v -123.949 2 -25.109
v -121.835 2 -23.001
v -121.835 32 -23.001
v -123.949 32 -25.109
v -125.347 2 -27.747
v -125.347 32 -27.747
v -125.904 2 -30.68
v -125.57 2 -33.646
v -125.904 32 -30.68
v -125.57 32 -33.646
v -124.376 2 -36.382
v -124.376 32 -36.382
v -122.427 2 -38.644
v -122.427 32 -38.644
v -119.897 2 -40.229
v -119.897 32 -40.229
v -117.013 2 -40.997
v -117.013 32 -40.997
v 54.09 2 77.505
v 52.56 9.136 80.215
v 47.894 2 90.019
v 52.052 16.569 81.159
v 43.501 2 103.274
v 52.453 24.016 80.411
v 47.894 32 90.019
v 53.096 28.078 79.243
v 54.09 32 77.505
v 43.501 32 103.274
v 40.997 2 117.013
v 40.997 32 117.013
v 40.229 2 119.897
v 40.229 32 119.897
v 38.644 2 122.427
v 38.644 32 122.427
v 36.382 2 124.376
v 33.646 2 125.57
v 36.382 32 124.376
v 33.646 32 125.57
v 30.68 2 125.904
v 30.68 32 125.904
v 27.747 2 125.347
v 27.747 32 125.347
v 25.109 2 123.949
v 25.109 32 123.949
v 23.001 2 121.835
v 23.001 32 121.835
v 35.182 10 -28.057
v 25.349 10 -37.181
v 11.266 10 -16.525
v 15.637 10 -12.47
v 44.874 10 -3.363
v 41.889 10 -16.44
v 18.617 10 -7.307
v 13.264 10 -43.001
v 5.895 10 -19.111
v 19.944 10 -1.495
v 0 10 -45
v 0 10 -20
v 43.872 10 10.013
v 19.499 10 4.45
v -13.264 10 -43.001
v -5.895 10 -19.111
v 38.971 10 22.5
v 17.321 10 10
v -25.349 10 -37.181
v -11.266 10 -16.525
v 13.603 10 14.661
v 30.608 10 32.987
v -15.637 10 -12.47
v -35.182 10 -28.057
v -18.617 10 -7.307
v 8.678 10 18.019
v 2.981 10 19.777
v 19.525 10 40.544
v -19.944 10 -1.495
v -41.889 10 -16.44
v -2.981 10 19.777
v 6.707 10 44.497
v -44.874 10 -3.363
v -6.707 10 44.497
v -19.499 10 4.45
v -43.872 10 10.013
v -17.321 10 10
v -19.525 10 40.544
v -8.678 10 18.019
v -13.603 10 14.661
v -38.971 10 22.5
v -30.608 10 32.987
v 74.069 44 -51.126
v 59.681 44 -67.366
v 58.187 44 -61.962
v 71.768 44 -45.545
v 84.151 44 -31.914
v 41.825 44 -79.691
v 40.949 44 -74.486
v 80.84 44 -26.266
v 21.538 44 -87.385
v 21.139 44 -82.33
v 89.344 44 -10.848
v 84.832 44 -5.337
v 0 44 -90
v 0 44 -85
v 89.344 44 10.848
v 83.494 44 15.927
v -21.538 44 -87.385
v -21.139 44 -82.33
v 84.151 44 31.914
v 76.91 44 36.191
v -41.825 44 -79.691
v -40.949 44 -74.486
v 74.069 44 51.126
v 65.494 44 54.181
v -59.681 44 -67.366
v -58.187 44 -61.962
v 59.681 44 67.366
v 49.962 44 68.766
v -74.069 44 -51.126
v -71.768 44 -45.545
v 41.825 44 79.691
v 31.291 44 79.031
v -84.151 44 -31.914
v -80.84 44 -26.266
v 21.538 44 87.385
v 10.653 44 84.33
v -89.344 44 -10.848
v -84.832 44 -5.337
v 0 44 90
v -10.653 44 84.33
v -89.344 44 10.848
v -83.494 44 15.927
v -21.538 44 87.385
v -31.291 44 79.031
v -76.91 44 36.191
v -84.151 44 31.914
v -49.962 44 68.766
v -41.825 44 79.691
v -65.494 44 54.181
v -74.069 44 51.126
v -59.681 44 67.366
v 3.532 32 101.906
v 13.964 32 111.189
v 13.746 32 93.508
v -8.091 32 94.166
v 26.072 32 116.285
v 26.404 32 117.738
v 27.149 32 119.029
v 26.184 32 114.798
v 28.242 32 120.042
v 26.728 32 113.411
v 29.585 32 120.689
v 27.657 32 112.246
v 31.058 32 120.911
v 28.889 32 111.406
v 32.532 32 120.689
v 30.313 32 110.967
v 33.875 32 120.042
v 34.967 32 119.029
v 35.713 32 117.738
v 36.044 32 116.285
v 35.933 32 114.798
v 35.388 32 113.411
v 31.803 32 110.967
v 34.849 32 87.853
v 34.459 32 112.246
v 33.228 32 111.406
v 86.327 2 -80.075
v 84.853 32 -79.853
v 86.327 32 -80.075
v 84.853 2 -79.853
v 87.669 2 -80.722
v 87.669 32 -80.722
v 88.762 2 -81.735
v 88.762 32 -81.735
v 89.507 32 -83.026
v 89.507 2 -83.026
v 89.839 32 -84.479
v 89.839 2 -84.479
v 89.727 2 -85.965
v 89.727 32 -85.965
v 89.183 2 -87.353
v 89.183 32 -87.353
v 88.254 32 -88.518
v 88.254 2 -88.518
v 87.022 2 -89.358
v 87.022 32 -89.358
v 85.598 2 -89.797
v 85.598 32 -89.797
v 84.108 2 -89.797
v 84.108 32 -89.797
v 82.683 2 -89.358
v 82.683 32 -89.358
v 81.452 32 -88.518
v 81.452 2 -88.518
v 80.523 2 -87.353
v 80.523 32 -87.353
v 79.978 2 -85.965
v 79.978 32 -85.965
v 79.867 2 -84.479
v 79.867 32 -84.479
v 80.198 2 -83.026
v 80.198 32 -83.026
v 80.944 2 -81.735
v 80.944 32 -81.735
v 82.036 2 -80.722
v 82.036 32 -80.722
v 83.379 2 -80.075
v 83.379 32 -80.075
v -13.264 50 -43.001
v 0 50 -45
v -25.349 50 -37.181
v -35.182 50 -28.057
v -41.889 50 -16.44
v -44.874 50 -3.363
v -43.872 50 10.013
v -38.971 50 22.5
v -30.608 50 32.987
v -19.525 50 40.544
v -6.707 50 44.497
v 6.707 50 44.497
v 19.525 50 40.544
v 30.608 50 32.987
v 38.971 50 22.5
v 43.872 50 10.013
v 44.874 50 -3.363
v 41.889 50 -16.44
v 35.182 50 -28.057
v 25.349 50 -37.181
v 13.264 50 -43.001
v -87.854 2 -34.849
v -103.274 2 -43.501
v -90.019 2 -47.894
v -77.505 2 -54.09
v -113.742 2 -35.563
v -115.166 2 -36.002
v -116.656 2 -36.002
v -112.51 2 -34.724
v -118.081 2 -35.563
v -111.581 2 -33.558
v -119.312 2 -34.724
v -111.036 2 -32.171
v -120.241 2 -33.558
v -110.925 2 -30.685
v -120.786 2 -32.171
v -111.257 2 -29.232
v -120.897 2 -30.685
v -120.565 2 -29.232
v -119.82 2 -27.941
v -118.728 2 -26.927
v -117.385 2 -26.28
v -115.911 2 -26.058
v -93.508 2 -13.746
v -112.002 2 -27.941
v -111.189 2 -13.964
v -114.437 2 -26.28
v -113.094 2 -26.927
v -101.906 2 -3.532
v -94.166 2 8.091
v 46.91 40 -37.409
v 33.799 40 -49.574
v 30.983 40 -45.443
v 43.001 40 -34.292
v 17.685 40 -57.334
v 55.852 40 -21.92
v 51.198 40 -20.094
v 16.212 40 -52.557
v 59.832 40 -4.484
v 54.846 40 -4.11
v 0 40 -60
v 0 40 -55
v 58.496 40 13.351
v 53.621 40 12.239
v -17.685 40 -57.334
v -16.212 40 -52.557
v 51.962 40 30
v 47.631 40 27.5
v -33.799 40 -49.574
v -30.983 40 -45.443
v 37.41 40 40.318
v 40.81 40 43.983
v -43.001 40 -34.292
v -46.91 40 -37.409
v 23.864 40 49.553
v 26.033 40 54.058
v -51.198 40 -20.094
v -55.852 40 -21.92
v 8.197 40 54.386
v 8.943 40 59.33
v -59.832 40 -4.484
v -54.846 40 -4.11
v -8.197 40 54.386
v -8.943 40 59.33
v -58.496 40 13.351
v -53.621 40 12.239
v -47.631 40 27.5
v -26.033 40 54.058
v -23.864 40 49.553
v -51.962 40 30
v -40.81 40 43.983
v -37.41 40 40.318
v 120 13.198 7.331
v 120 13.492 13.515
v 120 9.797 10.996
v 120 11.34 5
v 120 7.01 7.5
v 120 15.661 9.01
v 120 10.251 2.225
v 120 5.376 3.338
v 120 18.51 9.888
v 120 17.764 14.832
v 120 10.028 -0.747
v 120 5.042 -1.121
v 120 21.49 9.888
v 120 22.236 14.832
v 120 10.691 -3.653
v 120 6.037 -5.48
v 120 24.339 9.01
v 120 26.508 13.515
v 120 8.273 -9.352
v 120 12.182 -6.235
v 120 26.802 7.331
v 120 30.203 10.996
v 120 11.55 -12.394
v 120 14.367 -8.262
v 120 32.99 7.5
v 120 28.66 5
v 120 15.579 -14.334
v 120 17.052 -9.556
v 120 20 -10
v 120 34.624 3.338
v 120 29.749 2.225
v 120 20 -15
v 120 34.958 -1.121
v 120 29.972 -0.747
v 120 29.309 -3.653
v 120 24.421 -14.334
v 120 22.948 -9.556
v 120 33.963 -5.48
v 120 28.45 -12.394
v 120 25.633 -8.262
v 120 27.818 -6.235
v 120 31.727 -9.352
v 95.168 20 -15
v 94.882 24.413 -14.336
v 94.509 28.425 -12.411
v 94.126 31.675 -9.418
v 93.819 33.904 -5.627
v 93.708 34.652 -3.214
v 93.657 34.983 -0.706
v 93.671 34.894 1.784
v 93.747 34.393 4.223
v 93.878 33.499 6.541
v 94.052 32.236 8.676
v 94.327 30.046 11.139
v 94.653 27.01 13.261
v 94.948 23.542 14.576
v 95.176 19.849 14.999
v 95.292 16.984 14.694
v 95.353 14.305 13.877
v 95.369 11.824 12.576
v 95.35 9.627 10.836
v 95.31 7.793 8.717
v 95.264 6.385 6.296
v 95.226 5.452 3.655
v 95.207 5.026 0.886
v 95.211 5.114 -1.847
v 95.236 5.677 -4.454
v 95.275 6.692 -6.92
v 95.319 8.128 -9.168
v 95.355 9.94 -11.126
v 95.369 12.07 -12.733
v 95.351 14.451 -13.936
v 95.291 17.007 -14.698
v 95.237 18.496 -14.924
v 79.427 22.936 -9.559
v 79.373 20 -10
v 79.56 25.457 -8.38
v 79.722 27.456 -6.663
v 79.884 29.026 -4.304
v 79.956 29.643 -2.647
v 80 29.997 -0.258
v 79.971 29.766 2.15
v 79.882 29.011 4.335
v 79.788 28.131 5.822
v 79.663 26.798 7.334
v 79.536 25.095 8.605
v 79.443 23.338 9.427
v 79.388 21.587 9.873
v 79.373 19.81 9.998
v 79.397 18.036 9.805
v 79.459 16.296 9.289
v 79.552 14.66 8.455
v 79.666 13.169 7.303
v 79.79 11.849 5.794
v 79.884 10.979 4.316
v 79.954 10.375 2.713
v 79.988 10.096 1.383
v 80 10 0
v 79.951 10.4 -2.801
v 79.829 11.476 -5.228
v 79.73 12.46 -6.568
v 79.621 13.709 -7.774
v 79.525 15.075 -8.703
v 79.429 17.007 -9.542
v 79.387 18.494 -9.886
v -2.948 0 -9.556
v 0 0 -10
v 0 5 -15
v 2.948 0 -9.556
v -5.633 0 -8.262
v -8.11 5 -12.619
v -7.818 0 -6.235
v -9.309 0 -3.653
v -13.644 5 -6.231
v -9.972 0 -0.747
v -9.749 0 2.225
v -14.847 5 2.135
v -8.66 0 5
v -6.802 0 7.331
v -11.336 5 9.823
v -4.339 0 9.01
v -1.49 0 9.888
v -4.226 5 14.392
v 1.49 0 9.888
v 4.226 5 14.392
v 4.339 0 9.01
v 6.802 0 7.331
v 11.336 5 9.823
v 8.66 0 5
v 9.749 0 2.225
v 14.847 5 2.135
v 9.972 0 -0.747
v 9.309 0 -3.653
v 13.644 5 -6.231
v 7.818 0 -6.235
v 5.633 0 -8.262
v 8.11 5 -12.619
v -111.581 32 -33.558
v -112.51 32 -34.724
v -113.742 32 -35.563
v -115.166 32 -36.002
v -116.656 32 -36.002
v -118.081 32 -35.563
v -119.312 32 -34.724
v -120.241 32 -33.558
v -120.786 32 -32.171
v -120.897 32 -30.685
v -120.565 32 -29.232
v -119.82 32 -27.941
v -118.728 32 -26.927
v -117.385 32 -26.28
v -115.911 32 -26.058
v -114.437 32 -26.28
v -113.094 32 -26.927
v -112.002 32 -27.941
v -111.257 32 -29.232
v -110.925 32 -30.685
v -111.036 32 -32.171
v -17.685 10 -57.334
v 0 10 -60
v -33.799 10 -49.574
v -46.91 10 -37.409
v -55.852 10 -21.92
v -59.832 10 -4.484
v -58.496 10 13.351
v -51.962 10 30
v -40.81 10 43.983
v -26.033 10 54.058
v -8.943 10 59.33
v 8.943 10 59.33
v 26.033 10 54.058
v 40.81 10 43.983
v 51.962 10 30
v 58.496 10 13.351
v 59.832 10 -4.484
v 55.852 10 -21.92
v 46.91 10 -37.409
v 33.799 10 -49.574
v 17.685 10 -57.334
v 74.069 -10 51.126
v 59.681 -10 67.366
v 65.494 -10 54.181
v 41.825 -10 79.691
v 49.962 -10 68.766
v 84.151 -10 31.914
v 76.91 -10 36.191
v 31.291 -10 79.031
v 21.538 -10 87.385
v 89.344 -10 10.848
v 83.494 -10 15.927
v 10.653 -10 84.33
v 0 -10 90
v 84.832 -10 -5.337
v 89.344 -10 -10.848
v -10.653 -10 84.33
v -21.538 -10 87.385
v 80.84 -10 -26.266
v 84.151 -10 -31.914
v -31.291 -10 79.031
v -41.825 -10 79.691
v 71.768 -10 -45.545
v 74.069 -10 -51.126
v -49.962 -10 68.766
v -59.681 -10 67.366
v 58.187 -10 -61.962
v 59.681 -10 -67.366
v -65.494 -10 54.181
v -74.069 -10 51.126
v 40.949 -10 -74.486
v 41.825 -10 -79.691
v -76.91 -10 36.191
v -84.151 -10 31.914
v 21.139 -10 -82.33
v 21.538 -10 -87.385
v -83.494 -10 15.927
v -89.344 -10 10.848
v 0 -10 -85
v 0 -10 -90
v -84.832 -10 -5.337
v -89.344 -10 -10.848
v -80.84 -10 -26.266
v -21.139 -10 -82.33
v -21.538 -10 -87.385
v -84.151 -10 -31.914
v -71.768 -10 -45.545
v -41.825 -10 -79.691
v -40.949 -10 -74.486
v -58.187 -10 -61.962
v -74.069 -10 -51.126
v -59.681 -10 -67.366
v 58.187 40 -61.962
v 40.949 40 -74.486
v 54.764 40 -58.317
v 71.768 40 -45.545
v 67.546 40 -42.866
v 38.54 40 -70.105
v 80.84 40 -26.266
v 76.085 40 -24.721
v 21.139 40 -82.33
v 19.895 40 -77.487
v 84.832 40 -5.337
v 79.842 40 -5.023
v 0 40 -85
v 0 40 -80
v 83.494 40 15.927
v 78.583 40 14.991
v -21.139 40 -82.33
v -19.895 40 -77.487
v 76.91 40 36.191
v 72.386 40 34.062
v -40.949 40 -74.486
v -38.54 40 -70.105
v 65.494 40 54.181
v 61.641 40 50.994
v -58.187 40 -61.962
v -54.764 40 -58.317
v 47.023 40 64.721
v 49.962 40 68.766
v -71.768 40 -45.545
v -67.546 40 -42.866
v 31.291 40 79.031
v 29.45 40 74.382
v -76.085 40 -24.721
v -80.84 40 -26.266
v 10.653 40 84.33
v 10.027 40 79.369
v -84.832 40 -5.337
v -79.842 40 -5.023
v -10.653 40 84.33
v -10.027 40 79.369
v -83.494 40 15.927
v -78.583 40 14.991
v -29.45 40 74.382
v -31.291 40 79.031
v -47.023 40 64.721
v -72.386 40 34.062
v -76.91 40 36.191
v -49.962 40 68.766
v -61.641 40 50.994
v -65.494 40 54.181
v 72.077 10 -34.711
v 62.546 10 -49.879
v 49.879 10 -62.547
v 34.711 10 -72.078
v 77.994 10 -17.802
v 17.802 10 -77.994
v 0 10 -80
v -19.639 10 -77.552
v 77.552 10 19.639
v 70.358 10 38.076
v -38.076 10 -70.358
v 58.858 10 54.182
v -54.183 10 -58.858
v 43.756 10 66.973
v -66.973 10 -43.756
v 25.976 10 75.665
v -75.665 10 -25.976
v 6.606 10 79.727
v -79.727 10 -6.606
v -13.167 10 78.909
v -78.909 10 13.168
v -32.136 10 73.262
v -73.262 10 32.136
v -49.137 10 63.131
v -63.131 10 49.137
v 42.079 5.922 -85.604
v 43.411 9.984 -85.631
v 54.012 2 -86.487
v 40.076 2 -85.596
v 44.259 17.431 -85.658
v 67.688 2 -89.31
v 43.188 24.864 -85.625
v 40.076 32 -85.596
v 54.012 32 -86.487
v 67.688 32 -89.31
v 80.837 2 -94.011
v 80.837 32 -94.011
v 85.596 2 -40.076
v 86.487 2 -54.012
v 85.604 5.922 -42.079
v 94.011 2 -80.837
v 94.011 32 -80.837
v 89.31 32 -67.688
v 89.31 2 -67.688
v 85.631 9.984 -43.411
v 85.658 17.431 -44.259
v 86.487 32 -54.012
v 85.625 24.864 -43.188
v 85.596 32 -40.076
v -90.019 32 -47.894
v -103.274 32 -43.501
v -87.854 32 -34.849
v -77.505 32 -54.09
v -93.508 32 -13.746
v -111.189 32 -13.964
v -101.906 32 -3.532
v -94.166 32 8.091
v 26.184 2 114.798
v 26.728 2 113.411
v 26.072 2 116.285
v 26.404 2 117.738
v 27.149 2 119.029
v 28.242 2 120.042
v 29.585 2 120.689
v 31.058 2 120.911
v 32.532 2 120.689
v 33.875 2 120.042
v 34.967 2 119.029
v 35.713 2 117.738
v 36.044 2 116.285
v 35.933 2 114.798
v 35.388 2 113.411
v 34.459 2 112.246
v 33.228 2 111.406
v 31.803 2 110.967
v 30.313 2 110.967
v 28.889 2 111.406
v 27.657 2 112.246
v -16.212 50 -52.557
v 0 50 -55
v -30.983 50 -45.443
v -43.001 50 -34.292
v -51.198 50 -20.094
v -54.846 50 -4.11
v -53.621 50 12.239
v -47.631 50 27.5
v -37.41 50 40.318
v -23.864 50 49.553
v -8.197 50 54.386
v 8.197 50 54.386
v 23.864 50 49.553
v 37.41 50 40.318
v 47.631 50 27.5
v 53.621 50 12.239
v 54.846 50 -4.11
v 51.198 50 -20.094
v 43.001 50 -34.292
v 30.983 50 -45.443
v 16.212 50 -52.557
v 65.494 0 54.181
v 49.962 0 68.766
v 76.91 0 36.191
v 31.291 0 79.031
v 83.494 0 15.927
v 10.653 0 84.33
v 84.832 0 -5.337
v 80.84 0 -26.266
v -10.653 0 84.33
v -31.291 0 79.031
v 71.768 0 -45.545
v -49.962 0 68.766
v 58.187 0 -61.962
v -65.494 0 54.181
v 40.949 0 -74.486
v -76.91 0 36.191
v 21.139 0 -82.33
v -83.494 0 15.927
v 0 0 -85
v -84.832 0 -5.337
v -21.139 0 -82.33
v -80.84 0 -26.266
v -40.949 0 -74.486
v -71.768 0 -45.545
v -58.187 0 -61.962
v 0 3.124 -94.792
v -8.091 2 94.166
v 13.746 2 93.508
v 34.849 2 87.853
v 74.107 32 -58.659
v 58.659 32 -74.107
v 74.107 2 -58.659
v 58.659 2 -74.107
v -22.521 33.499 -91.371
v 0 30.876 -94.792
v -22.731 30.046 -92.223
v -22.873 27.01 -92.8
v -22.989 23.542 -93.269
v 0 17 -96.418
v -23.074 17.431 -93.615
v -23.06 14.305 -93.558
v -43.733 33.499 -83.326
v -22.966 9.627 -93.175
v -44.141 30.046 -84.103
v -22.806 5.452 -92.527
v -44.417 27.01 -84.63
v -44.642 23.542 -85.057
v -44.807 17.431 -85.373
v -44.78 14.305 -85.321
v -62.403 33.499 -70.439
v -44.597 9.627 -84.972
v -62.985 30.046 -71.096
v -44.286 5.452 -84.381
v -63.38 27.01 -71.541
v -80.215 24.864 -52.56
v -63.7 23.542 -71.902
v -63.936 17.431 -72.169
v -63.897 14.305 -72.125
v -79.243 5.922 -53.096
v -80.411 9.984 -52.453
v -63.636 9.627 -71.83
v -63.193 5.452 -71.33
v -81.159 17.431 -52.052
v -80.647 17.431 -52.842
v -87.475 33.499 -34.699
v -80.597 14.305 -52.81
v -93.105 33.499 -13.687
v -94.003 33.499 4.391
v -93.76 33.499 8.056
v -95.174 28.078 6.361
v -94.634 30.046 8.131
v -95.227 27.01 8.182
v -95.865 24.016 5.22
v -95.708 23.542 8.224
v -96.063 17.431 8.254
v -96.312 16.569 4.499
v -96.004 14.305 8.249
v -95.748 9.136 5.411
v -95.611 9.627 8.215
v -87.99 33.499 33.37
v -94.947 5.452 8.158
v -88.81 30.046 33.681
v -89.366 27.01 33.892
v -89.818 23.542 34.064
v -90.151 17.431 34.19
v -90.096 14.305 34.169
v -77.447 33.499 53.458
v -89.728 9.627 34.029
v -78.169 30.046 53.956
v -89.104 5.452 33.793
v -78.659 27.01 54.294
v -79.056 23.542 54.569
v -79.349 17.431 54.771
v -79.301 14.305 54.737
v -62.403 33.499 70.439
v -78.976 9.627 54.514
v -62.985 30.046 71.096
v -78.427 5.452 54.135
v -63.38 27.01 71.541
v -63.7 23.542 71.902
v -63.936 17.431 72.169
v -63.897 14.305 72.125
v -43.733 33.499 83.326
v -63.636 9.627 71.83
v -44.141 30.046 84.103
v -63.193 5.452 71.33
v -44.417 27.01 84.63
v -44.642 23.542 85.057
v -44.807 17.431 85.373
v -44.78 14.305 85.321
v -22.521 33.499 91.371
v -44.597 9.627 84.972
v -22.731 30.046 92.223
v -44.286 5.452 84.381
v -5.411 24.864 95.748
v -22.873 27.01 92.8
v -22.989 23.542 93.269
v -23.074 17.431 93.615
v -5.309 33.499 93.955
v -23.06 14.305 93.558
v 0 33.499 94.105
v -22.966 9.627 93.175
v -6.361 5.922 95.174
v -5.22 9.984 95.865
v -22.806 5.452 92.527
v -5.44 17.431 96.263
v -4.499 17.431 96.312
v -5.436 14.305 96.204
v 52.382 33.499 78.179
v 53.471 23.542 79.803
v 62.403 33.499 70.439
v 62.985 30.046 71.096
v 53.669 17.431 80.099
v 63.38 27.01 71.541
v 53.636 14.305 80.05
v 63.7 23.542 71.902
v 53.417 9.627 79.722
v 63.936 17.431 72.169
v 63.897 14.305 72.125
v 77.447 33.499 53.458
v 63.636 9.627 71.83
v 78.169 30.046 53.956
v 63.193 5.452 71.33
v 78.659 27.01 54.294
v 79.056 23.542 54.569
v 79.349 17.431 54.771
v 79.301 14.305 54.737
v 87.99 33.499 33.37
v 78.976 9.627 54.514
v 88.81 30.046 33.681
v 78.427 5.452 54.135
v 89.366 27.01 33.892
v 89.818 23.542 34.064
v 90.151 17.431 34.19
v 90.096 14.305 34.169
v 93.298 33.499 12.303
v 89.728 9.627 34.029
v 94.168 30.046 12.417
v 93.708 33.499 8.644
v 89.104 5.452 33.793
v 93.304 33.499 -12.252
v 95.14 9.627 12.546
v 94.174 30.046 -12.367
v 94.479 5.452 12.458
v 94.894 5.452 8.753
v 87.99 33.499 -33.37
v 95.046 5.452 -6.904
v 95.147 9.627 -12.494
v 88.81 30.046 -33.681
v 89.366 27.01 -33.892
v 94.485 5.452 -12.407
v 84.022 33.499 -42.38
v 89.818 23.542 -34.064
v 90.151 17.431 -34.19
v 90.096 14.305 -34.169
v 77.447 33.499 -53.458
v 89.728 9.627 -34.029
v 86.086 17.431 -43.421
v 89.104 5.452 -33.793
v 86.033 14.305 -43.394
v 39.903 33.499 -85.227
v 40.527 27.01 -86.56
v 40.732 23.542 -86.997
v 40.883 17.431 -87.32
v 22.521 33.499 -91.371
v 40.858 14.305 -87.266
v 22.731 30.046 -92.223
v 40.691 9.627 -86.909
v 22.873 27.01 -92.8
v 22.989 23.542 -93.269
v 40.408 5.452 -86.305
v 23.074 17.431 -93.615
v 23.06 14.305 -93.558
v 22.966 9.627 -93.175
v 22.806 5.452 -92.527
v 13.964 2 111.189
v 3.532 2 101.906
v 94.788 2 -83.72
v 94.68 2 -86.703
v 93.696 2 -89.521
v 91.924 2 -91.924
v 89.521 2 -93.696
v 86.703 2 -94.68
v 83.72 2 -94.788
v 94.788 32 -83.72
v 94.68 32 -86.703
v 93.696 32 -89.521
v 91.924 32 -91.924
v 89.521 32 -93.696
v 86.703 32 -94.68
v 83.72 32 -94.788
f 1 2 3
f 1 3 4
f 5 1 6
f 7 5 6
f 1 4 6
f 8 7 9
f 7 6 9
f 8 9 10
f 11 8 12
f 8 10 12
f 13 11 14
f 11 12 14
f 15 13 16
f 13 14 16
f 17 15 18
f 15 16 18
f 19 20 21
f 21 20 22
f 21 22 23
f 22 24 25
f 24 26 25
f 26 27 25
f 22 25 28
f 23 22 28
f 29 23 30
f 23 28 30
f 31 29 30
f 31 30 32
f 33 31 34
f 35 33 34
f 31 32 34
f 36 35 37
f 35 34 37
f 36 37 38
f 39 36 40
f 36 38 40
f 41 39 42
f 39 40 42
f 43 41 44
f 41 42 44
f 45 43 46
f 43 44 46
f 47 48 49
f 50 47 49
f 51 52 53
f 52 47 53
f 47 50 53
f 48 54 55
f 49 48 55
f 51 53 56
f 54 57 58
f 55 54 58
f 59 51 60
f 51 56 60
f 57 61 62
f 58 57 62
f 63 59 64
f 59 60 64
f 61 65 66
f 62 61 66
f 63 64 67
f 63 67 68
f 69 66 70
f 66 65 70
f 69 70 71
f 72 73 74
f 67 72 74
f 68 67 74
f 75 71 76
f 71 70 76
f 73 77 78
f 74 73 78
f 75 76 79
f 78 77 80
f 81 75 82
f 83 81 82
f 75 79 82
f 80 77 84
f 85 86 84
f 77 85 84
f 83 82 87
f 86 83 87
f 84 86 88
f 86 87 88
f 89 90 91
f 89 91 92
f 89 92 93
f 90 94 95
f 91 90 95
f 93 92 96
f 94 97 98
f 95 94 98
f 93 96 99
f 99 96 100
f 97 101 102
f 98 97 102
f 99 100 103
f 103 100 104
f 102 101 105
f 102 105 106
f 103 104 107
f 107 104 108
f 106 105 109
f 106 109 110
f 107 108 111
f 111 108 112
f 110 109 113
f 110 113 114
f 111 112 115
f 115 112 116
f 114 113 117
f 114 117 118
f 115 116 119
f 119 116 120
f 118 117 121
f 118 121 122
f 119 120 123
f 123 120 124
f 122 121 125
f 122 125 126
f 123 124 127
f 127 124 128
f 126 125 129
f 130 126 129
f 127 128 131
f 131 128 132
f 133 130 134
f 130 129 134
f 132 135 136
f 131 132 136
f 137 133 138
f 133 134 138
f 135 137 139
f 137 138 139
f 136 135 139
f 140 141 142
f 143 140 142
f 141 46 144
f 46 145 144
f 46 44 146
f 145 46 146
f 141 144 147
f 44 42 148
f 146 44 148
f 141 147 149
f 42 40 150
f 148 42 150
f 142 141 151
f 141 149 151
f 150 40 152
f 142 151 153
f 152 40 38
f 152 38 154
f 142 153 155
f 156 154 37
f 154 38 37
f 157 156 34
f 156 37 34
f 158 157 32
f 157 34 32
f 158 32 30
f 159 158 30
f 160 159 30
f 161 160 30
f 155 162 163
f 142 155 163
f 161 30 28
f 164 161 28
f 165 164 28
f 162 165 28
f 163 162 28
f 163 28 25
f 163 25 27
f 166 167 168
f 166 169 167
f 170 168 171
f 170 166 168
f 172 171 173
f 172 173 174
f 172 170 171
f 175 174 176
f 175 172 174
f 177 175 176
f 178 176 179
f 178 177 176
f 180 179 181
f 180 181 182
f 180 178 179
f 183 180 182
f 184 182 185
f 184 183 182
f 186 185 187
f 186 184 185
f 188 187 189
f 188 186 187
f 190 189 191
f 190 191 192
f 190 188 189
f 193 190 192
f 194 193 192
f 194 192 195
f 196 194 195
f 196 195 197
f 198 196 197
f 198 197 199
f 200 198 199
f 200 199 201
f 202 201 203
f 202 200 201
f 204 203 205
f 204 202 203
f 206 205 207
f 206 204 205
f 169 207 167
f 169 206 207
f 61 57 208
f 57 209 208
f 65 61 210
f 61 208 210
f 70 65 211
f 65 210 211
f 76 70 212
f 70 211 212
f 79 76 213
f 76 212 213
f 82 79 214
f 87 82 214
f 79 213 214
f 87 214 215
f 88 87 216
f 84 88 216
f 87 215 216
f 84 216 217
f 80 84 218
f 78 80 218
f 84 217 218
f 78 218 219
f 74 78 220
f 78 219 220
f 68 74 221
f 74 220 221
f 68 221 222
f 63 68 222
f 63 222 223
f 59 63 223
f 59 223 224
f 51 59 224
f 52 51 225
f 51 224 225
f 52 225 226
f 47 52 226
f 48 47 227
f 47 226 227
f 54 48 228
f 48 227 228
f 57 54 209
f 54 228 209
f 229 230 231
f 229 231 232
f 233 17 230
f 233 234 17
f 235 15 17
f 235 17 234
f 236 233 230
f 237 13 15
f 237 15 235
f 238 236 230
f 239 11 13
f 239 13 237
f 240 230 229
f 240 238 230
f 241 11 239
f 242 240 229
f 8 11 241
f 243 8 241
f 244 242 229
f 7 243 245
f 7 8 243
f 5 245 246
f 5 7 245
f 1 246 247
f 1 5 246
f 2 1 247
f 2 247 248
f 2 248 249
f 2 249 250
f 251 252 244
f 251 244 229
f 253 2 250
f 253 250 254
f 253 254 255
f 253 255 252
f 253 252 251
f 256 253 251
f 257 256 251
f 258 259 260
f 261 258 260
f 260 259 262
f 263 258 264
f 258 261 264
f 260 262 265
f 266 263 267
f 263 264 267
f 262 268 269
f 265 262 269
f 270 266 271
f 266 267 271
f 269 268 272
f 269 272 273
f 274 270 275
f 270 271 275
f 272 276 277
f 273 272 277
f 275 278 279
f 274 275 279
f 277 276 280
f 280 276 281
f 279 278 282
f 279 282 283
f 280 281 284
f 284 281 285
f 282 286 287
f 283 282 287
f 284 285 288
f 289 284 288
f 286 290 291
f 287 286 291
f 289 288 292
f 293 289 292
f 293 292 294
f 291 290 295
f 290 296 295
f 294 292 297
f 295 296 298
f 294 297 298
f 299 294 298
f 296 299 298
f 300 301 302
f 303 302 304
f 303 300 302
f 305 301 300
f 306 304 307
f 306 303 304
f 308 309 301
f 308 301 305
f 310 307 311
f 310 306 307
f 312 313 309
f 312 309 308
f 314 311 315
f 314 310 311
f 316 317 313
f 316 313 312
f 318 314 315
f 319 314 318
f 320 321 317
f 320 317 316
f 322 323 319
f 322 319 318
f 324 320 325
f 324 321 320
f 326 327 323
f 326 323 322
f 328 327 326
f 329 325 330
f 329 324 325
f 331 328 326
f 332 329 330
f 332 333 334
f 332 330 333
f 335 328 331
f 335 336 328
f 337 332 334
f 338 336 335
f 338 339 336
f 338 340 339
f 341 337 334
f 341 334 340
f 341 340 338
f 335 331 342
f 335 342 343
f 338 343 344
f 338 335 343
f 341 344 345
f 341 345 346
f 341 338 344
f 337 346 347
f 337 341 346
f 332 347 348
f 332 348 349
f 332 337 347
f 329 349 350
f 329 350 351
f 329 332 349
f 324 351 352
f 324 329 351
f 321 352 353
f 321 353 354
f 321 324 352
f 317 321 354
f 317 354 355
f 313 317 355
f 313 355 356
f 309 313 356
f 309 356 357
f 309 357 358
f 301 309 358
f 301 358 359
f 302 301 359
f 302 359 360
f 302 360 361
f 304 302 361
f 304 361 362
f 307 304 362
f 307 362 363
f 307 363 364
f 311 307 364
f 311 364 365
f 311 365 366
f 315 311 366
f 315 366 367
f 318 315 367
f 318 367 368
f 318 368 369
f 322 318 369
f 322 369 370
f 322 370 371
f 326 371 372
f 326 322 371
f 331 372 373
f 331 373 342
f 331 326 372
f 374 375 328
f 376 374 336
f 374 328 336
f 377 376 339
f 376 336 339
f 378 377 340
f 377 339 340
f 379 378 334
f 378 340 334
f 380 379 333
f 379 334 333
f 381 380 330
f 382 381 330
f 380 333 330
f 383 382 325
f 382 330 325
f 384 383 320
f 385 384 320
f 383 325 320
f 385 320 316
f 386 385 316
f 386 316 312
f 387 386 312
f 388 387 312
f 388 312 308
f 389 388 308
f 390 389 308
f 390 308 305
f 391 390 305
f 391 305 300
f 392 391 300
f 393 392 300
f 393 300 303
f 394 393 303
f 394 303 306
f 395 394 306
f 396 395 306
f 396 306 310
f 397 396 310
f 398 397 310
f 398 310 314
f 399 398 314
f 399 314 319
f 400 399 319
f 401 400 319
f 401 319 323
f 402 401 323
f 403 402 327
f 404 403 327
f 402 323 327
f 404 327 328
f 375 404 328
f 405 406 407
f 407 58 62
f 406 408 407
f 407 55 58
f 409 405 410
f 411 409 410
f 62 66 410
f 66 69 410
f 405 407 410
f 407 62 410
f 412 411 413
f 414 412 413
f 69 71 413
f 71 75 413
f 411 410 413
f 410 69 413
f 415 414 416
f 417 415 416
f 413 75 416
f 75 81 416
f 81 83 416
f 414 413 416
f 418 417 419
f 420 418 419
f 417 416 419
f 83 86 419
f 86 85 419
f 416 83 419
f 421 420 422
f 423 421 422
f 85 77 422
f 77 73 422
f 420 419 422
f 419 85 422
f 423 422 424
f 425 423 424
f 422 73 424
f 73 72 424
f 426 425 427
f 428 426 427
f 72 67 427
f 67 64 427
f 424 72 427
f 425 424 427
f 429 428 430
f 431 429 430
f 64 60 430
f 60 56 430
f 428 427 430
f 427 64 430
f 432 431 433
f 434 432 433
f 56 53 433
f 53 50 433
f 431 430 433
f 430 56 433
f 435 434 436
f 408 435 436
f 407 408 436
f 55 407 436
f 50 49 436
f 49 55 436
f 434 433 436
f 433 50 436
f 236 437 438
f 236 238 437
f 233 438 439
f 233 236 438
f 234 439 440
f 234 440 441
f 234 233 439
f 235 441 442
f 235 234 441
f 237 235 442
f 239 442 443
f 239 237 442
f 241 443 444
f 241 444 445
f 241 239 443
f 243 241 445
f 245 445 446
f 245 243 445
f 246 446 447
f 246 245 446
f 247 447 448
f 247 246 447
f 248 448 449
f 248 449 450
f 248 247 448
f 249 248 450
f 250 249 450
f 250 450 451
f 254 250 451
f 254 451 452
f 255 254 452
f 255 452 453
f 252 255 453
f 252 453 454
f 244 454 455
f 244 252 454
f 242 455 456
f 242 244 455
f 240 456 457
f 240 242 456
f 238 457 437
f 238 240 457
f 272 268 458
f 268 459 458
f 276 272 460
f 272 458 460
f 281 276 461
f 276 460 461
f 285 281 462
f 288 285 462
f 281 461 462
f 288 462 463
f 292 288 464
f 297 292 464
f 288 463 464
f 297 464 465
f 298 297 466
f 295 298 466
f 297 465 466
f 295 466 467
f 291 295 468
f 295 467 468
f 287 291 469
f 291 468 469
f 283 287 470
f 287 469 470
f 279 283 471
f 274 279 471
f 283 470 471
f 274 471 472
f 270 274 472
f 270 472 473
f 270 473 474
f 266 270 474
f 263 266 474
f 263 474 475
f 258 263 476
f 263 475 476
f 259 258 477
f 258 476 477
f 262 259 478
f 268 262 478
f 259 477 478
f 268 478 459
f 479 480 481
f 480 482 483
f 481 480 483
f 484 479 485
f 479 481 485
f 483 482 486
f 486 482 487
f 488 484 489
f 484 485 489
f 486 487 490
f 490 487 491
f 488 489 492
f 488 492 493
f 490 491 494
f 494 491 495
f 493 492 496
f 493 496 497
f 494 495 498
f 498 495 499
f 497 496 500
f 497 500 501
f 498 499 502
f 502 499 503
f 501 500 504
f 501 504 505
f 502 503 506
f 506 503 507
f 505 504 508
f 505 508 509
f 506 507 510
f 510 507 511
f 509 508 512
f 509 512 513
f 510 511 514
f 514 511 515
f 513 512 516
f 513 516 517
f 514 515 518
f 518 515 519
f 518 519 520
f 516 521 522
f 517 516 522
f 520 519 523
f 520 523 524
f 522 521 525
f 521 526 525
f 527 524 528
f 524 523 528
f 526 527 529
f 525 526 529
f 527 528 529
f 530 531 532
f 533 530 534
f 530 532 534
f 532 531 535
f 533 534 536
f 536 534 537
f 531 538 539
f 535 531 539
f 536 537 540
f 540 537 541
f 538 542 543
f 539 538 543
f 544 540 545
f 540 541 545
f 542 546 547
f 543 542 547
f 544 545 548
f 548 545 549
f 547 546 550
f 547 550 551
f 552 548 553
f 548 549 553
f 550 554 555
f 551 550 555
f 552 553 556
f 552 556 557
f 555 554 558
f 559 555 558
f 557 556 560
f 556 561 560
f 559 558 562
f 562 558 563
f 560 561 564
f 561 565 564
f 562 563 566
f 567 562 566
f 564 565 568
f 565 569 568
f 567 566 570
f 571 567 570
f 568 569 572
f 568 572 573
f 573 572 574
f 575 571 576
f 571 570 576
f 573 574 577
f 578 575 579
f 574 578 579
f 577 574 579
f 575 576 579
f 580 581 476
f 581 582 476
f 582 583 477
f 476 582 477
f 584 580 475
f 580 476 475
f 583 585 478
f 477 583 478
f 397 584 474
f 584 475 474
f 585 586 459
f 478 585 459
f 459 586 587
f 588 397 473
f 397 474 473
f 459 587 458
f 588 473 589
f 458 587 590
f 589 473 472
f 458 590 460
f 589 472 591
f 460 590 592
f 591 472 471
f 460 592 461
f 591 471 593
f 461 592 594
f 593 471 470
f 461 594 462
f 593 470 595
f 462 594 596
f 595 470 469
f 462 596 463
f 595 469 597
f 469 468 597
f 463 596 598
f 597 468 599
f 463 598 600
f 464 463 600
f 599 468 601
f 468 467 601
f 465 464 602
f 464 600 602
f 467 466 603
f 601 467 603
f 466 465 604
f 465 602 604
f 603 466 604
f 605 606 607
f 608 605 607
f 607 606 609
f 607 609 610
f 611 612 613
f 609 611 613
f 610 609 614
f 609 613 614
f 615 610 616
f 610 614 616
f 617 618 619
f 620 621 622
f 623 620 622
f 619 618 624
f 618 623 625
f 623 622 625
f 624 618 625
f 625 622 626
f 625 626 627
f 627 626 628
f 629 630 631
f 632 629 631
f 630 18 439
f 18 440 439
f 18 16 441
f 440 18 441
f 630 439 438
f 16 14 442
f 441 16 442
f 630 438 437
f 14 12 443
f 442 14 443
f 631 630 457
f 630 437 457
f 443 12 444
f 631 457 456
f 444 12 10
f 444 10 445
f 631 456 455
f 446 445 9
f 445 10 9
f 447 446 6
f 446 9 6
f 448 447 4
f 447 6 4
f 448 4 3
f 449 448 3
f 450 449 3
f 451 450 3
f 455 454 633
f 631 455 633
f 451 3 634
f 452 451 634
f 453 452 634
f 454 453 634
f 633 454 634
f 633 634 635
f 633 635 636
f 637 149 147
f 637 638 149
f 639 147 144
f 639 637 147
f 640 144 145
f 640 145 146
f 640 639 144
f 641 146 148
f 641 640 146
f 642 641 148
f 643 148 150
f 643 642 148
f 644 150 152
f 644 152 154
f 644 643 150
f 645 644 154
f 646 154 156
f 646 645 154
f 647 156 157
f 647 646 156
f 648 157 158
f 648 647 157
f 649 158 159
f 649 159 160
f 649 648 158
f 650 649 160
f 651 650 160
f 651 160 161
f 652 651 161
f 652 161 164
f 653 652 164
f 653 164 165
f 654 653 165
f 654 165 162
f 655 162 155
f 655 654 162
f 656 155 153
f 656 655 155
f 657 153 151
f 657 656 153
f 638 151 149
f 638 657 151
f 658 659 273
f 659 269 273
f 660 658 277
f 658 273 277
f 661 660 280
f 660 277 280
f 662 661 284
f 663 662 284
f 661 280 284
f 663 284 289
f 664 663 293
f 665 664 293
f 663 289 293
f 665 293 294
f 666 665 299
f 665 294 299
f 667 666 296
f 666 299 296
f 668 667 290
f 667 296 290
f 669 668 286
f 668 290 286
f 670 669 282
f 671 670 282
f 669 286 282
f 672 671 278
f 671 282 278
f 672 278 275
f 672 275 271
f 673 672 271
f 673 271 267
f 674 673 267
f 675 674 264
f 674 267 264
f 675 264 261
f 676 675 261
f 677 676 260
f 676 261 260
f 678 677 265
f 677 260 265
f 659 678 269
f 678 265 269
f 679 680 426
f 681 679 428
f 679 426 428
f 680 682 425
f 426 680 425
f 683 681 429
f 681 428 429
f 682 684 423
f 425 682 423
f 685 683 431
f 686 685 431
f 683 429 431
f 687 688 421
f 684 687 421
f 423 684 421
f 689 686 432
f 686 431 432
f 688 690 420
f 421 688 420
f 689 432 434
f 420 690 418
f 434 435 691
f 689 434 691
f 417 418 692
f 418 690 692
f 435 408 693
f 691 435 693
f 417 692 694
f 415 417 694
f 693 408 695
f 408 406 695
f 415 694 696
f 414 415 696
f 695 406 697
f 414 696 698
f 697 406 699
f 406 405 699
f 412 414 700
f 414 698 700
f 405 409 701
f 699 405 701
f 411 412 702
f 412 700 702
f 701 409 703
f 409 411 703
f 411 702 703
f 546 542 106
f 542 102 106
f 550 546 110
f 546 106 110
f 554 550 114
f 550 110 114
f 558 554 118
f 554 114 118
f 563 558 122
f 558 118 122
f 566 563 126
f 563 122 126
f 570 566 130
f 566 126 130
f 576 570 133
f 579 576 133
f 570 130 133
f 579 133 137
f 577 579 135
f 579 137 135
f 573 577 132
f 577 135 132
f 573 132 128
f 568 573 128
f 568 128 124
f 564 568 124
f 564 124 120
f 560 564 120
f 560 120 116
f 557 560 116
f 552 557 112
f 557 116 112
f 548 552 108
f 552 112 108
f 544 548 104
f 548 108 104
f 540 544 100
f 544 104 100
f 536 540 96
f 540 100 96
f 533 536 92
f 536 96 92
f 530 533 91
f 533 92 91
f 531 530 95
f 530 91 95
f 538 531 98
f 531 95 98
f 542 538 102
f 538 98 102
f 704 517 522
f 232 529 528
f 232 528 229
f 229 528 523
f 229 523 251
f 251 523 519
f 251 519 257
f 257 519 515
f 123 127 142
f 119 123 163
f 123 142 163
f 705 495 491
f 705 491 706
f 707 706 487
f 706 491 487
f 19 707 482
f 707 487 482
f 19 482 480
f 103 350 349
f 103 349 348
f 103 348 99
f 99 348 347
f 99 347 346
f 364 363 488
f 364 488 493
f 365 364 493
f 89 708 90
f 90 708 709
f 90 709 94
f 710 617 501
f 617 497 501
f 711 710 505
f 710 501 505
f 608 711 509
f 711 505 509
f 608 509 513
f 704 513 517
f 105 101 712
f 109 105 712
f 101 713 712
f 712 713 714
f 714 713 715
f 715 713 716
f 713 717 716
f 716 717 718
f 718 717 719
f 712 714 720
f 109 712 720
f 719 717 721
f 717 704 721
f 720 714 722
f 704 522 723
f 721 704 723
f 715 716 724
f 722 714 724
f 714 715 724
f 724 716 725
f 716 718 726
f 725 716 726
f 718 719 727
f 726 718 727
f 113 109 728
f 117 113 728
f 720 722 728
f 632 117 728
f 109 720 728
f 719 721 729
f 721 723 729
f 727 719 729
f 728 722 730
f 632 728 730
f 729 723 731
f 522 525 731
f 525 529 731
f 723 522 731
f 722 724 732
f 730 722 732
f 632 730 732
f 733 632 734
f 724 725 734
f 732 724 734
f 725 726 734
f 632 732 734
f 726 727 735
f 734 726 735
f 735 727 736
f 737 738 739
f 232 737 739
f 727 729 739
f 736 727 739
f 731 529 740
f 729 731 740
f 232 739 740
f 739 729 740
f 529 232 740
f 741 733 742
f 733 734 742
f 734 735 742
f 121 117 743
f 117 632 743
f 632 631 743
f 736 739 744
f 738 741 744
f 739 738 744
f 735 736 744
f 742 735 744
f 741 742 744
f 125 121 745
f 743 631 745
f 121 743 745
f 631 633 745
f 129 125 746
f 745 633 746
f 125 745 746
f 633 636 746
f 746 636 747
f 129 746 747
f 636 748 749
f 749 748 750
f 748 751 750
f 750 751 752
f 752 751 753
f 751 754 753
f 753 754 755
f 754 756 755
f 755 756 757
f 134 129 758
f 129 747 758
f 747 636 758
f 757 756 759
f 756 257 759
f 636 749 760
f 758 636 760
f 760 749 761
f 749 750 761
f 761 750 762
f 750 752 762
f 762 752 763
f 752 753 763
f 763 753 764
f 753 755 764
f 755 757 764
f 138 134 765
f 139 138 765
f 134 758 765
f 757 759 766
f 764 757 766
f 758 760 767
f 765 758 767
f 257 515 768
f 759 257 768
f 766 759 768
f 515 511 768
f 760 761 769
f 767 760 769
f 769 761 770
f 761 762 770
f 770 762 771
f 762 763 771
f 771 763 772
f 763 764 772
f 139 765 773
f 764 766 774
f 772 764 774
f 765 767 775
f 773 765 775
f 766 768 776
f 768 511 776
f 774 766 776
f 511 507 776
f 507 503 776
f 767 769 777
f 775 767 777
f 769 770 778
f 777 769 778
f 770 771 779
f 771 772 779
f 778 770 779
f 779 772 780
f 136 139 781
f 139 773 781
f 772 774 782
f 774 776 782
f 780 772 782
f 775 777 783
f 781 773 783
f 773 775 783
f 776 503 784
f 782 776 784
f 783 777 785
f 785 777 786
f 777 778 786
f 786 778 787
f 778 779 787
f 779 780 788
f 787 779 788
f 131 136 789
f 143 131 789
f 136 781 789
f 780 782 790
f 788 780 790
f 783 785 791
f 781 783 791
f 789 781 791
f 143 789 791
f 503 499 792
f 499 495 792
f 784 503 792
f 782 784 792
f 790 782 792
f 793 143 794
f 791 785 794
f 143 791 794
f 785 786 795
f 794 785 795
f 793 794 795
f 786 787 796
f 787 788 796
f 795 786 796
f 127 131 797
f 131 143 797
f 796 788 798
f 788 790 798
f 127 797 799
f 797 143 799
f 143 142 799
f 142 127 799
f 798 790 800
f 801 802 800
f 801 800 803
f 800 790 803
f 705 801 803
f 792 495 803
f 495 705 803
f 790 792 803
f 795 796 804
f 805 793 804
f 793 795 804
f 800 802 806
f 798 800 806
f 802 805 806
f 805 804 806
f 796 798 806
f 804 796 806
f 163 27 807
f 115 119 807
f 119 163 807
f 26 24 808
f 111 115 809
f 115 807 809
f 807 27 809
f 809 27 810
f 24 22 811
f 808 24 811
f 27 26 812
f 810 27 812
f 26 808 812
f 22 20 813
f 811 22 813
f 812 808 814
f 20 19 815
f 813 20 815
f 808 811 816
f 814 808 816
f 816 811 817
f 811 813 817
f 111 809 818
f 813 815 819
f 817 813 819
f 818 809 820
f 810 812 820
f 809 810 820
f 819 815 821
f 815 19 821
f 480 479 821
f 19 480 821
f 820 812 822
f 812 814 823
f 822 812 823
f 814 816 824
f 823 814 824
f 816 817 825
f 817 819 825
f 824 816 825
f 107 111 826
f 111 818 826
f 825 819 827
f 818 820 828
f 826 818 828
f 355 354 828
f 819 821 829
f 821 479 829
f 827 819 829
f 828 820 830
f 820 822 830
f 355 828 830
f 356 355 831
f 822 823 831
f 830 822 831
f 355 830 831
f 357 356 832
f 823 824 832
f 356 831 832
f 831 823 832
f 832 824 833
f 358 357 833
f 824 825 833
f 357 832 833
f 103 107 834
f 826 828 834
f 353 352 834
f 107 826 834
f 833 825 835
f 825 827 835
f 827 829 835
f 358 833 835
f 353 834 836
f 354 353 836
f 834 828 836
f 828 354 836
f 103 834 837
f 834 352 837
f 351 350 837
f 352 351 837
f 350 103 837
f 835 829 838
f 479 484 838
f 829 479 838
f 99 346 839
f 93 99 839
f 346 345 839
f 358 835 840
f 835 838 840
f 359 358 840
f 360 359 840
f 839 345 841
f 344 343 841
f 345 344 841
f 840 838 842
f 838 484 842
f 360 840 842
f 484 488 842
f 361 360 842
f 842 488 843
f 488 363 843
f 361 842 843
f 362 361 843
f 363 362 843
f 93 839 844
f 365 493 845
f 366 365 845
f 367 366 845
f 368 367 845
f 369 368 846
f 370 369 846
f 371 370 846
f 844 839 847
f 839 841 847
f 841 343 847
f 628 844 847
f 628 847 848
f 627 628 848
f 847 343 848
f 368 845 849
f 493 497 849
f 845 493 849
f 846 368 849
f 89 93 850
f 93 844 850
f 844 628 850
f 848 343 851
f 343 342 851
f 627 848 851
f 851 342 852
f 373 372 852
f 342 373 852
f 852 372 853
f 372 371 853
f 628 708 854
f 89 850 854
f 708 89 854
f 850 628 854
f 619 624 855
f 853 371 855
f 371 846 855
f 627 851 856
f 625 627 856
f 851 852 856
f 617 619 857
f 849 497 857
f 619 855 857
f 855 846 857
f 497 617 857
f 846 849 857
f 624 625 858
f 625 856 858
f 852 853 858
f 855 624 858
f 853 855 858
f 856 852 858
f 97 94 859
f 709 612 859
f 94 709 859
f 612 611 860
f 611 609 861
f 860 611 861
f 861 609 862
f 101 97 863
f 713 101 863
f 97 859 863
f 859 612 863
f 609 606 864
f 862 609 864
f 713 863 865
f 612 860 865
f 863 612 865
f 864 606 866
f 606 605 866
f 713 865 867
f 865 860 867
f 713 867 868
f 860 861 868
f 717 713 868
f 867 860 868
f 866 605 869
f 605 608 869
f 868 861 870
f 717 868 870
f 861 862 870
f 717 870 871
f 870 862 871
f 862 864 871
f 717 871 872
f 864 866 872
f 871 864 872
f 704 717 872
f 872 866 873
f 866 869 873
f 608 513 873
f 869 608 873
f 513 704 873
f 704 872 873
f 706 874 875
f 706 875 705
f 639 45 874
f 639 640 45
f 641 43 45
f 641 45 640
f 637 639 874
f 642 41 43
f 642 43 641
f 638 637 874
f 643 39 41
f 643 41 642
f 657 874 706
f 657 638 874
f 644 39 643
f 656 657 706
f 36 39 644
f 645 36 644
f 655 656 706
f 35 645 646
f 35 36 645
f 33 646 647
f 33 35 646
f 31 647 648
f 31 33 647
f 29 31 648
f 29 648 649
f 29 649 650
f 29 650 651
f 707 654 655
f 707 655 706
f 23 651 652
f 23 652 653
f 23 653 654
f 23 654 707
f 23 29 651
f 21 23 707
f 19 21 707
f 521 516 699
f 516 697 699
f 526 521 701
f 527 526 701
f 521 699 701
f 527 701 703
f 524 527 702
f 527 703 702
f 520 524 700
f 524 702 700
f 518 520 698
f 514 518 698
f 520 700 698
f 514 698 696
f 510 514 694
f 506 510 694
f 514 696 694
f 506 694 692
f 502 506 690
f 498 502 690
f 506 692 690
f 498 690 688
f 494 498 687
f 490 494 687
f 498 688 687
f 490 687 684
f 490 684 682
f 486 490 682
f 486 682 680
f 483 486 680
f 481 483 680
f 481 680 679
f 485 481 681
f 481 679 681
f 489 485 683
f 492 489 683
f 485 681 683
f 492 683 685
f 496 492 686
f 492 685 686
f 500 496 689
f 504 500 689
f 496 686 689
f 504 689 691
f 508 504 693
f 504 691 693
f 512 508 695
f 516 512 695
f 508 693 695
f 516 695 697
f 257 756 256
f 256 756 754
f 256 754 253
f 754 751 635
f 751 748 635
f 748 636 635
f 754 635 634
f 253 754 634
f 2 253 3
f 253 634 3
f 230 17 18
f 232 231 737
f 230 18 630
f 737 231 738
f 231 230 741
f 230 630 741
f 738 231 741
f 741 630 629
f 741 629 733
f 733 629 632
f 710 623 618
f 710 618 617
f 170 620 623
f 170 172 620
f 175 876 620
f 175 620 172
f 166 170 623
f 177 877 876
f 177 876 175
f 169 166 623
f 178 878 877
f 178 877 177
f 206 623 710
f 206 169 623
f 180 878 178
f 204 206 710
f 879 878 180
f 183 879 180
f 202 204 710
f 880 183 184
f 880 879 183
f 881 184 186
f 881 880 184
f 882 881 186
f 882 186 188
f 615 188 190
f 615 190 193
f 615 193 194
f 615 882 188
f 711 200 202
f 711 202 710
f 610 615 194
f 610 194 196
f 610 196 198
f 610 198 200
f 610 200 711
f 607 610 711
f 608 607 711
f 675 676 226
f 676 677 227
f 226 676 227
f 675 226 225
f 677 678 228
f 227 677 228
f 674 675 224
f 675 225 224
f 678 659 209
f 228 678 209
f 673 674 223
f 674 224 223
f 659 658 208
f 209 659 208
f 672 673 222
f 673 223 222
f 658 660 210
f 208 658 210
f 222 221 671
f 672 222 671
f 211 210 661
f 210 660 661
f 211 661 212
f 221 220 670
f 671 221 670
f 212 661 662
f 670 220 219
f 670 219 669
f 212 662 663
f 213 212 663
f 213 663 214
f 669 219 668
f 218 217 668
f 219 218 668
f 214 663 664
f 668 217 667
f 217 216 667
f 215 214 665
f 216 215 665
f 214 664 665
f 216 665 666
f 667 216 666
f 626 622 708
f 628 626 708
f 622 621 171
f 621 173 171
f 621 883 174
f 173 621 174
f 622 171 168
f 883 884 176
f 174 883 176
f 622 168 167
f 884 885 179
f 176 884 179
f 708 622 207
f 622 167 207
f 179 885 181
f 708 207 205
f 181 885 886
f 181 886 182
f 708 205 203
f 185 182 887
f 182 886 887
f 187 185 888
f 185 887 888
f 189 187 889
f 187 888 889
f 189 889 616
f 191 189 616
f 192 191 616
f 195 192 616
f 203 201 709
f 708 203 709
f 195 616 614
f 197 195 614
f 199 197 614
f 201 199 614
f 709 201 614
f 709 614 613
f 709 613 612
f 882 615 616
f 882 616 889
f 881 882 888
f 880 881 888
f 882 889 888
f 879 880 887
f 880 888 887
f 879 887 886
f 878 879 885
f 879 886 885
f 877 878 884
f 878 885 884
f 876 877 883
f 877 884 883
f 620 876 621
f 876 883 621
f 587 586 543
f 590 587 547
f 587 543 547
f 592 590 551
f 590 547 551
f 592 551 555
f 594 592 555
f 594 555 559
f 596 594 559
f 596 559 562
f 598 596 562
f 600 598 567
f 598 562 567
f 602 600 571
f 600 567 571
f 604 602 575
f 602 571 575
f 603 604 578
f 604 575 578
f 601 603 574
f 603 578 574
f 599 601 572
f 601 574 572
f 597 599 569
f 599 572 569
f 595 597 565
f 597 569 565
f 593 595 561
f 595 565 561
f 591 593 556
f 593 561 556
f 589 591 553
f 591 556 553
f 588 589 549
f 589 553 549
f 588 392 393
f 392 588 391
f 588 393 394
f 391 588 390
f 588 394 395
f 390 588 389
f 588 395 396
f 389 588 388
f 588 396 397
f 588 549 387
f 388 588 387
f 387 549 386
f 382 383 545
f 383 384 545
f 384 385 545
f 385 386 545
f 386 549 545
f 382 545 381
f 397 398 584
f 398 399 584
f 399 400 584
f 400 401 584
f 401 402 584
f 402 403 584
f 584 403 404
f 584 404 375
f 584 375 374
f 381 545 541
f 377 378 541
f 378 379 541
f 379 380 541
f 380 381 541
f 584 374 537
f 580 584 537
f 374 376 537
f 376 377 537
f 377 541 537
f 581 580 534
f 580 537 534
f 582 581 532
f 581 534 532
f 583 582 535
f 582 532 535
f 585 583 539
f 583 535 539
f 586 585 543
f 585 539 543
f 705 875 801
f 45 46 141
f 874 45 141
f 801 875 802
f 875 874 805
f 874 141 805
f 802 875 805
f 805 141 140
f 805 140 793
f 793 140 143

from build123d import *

# Parameters (mm, degrees)
SKETCH2_R                      = 5
BOSS_EXTRUDE2_DEPTH            = 15
CIRPATTERN1_COUNT              = 3
BOSS_EXTRUDE3_REACH            = 247.911
BOSS_EXTRUDE3_END_MAJOR_RADIUS = 36.418286702
BOSS_EXTRUDE3_END_MINOR_RADIUS = 60
SKETCH4_R                      = 15
CUT_EXTRUDE1_REACH             = 247.911
CUT_EXTRUDE1_END_RADIUS        = 80
SKETCH5_R                      = 10


with BuildPart() as part:
    # Sketch1 → Revolve1 (revolve)
    with BuildSketch(Plane.XY, mode=Mode.PRIVATE) as revolve1_sk:
        with BuildLine():
            Line((10, 0), (20, 10))
            Line((20, 10), (45, 10))
            Line((45, 10), (45, 50))
            Line((45, 50), (55, 50))
            Line((55, 50), (55, 40))
            Line((55, 40), (60, 40))
            Line((60, 40), (60, 10))
            Line((60, 10), (80, 10))
            Line((80, 10), (80, 40))
            Line((80, 40), (85, 40))
            Line((85, 40), (85, 44))
            Line((85, 44), (90, 44))
            ThreePointArc((90, 44), (96.418286702, 17), (90, -10))
            Line((90, -10), (85, -10))
            Line((85, -10), (85, 0))
            Line((85, 0), (10, 0))
        make_face()
    revolve(revolve1_sk.sketch.rotate(Axis((0, 0, 0), (0, 1, 0)), 90), axis=Axis((0, 0, 0), (0, 1, 0)))  # turned: the seam where the file's is

    # Sketch2 → Boss-Extrude2 (add, symmetric)
    with BuildSketch(Plane(origin=(0, 17, 0), x_dir=(1, 0, 0), z_dir=(0, 1, 0))):
        with BuildLine():
            ThreePointArc((80.837121698, 94.011100559), (91.923881554, 91.923881554), (94.011100559, 80.837121698))
            ThreePointArc((94.011100559, 80.837121698), (86.080918037, 50.53681039), (87.912932552, 19.269569017))
            ThreePointArc((87.912932552, 19.269569017), (63.639610307, 63.639610307), (19.269569017, 87.912932552))
            ThreePointArc((19.269569017, 87.912932552), (50.53681039, 86.080918037), (80.837121698, 94.011100559))
        make_face()
        with Locations(Location((84.852813742, 84.852813742, 0), (0, 0, 270))):  # turned: the seam where the file's is
            Circle(SKETCH2_R, mode=Mode.SUBTRACT)
    boss_extrude2 = extrude(amount=BOSS_EXTRUDE2_DEPTH, both=True)

    # CirPattern1: Boss-Extrude2 ×3 about axis
    cirpattern1_axis = Axis((0, 0, 0), (0, 1, 0))
    for i in range(1, CIRPATTERN1_COUNT):
        add(boss_extrude2.rotate(cirpattern1_axis, i * 360 / CIRPATTERN1_COUNT))

    # Boss-Extrude3: up to this torus (the profile starts outside it)
    boss_extrude3_end = Plane(origin=(0, 17, 0), z_dir=(0, -1, 0)) * Torus(BOSS_EXTRUDE3_END_MAJOR_RADIUS, BOSS_EXTRUDE3_END_MINOR_RADIUS, mode=Mode.PRIVATE)
    # Sketch4 → Boss-Extrude3 (add, up to the surface)
    with BuildSketch(Plane(origin=(120, 0, 0), x_dir=(0, 0, -1), z_dir=(1, 0, 0)), mode=Mode.PRIVATE) as boss_extrude3_sk1:
        with Locations((0, 20)):
            Circle(SKETCH4_R)
    boss_extrude3_tool1 = extrude(boss_extrude3_sk1.sketch, amount=-BOSS_EXTRUDE3_REACH, mode=Mode.PRIVATE) - boss_extrude3_end
    add(boss_extrude3_tool1.solids().sort_by_distance((120, 20, 0))[0])

    # Cut-Extrude1: up to this cylinder (the profile starts outside it)
    cut_extrude1_end = Plane(origin=(0, 20, 0), z_dir=(0, -1, 0)) * Cylinder(CUT_EXTRUDE1_END_RADIUS, 656.822, mode=Mode.PRIVATE)
    # Sketch5 → Cut-Extrude1 (cut, up to the surface)
    with BuildSketch(Plane(origin=(120, 0, 0), x_dir=(0, 0, -1), z_dir=(1, 0, 0)), mode=Mode.PRIVATE) as cut_extrude1_sk1:
        with Locations((0, 20)):
            Circle(SKETCH5_R)
    cut_extrude1_tool1 = extrude(cut_extrude1_sk1.sketch, amount=-CUT_EXTRUDE1_REACH, mode=Mode.PRIVATE) - cut_extrude1_end
    add(cut_extrude1_tool1.solids().sort_by_distance((120, 20, 0))[0], mode=Mode.SUBTRACT)


solid = part.part
